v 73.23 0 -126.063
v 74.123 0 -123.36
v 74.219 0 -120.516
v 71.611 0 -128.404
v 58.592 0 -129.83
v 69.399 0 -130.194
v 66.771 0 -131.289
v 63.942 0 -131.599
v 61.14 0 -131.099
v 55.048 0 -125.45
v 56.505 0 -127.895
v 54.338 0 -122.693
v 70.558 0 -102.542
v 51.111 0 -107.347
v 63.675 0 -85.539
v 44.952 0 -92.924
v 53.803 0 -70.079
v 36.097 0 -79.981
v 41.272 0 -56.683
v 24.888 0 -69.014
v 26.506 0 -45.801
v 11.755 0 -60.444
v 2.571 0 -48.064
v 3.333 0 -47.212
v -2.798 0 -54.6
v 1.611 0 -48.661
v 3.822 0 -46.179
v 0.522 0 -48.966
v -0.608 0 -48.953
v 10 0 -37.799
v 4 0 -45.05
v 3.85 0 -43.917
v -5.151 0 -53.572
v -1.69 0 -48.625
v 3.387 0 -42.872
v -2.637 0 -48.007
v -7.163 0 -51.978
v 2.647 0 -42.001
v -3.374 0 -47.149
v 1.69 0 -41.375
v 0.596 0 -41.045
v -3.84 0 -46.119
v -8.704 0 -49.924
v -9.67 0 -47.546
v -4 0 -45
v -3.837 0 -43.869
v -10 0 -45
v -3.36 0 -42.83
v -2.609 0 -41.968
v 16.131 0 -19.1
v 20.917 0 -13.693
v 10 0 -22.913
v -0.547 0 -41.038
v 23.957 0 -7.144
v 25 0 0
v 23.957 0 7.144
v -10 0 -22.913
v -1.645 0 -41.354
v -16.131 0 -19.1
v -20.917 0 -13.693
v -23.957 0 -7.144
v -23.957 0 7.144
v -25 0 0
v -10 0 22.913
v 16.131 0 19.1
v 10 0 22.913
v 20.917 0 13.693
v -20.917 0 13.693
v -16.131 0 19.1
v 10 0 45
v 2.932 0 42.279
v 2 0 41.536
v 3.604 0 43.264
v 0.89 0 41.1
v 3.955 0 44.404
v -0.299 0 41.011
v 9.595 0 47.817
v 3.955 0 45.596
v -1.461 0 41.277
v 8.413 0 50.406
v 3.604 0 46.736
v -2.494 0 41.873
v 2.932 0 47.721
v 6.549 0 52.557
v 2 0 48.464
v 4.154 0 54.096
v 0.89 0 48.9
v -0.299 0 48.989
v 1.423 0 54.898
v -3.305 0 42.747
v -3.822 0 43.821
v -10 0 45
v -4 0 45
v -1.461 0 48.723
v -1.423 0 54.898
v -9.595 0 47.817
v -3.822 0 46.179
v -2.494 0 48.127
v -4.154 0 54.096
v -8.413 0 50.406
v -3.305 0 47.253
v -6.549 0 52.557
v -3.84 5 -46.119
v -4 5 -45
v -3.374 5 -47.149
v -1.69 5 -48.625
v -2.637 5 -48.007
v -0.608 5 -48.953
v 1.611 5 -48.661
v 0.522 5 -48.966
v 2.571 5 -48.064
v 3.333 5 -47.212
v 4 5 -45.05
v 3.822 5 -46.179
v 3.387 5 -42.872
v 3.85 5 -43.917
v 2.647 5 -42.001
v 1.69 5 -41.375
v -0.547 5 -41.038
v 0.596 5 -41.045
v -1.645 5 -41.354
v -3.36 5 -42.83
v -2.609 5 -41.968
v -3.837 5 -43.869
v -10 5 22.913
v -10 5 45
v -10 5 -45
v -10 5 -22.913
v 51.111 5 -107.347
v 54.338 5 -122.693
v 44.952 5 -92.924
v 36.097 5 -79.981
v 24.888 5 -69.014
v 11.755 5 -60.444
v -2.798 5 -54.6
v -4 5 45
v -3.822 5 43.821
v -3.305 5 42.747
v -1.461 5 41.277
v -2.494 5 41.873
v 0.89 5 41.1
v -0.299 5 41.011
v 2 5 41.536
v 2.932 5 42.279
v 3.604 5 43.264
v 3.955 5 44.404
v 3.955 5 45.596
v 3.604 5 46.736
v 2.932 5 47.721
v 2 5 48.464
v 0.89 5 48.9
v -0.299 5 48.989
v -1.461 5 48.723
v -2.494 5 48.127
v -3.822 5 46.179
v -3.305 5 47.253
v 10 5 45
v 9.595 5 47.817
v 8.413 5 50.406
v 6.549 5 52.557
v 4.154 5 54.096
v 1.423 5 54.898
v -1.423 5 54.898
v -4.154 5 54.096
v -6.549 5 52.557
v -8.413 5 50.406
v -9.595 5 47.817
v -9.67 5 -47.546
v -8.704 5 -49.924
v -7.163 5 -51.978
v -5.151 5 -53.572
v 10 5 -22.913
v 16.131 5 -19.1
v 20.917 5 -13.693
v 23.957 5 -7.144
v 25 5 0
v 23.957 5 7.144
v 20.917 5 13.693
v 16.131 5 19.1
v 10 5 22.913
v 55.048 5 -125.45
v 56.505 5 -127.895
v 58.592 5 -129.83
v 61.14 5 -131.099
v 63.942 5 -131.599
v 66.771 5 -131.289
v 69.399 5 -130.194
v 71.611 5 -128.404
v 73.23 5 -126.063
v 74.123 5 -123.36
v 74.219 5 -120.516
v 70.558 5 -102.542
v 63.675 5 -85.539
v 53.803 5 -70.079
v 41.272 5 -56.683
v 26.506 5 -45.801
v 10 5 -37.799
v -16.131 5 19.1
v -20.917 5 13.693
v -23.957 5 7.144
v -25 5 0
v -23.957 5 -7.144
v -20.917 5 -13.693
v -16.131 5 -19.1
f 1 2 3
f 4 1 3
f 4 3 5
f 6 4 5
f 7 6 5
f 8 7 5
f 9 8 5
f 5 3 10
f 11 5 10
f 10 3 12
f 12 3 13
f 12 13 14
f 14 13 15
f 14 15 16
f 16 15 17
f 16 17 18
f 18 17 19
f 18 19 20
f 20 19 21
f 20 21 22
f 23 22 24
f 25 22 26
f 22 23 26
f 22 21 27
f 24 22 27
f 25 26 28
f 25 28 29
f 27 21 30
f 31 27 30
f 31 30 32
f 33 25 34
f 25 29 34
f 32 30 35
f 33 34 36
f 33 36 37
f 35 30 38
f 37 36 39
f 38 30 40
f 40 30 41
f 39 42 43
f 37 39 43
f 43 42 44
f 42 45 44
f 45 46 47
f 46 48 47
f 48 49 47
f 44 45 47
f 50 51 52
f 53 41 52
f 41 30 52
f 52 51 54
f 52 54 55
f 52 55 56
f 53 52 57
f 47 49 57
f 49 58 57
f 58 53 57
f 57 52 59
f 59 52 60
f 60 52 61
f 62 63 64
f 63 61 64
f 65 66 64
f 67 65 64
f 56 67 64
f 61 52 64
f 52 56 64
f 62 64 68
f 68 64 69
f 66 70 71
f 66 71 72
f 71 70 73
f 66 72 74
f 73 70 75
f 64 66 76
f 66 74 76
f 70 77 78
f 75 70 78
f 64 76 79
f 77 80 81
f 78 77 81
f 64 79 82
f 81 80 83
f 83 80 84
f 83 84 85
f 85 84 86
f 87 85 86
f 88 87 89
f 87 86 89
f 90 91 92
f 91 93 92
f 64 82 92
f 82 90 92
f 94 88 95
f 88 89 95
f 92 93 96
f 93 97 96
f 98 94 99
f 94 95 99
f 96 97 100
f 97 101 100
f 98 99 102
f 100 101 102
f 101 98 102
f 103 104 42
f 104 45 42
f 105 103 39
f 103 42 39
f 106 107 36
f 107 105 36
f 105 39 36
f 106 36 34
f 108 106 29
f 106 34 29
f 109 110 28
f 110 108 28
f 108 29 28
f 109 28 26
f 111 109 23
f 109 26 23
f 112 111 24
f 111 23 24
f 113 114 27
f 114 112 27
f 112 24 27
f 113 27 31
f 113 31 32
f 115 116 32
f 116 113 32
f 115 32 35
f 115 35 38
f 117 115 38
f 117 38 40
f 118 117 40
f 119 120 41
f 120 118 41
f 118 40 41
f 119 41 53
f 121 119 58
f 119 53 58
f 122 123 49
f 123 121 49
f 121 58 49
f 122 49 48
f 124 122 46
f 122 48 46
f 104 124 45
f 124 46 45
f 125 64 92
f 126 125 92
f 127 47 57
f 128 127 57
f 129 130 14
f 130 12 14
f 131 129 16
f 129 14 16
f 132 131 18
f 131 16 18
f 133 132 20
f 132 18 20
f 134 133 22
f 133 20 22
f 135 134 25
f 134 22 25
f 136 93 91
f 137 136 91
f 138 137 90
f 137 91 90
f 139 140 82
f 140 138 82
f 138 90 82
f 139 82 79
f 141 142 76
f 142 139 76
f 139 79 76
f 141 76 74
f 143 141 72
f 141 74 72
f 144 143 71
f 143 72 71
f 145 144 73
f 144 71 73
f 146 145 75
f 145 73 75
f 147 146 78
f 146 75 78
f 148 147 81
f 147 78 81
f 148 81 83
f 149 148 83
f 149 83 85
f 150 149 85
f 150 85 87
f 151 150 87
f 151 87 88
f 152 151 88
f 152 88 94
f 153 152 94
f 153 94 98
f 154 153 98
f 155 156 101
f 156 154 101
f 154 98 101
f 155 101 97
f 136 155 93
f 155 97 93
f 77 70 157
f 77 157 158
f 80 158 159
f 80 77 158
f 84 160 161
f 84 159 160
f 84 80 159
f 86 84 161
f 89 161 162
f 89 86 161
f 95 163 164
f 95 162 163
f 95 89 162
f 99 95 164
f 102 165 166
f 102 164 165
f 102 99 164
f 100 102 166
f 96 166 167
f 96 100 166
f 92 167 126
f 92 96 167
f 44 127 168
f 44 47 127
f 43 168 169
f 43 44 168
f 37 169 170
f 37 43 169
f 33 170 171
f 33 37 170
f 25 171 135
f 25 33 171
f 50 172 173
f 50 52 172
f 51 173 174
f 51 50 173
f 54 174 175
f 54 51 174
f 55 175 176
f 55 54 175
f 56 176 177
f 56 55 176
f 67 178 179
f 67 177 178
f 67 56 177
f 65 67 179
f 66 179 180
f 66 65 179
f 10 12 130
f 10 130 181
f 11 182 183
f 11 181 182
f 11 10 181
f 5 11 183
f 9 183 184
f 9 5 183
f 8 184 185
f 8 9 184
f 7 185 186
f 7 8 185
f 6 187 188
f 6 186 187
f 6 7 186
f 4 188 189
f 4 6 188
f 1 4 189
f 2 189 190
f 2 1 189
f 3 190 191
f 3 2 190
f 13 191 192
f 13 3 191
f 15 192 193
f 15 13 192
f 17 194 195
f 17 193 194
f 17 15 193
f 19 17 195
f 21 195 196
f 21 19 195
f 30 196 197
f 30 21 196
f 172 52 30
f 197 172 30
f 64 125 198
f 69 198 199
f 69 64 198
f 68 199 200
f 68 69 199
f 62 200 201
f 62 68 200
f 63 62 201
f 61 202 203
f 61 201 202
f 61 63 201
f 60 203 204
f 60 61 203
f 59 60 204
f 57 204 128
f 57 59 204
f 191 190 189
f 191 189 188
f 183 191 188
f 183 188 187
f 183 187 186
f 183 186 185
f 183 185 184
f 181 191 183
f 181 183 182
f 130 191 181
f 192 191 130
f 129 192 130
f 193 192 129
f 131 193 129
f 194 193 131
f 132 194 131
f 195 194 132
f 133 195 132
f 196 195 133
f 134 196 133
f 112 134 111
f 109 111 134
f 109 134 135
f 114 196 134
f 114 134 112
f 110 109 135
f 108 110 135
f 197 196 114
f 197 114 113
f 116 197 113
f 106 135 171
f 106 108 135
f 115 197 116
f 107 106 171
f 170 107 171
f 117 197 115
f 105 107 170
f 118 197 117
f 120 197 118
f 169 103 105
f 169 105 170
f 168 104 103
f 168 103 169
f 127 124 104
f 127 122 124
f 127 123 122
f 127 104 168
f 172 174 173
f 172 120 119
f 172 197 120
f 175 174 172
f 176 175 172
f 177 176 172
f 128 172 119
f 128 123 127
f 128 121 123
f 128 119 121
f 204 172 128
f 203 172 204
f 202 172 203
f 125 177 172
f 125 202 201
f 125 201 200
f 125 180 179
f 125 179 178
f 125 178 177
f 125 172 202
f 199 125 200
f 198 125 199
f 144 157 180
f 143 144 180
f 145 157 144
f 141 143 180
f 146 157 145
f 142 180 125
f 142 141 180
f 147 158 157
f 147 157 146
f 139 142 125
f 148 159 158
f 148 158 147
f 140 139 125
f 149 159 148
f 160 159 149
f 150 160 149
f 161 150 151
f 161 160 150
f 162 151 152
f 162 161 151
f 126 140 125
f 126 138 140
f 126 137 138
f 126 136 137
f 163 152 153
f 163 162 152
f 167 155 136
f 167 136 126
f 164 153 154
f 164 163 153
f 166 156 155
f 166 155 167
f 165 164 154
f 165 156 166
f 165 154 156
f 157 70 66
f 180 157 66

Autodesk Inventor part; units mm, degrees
ref_plane "YZ Plane" through (0, 0, 0) normal (1, 0, 0) x (0, 1, 0)
ref_plane "XZ Plane" through (0, 0, 0) normal (0, 1, 0) x (-1, 0, 0)
ref_plane "XY Plane" through (0, 0, 0) normal (0, 0, 1) x (1, 0, 0)
sketch "Sketch1" plane through (0, 0, 0) normal (0, 1, 0) x (-1, 0, 0)
  line L0 (0, 45) -> (0, -45) construction
  line L1 (-10, 45) -> (-10, -45)
  line L2 (10, -45) -> (10, 45)
  arc A0 (10, 45) -> (-10, 45) centre (0, 45) ccw
  arc A1 (-10, -45) -> (10, -45) centre (0, -45) ccw
  circle A2 centre (0, 45) radius 4
  circle A3 centre (0, -45) radius 4
  arc A4 (0, -45) -> (-64.2788, -121.6044) centre (25.1861, -131.404) ccw construction
  arc A5 (-2.7985, -35.3996) -> (-74.2193, -120.5156) centre (25.1861, -131.404) ccw
  arc A6 (2.7985, -54.6004) -> (-54.3382, -122.6933) centre (25.1861, -131.404) ccw
  arc A7 (2.7985, -54.6004) -> (-2.7985, -35.3996) centre (0, -45) ccw
  arc A8 (-74.2193, -120.5156) -> (-54.3382, -122.6933) centre (-64.2788, -121.6044) ccw
  line L3 (-64.2788, -121.6044) -> (0, -45)
  circle A9 centre (0, 0) radius 25
  point P0 (-6.4279, -52.6604)
  point P1 (10, -22.9129)
  point P2 (10, 22.9129)
  point P3 (-10, 22.9129)
  point P4 (-10, -22.9129)
  point P5 (-10, -37.7988)
  point P6 (-13.9586, -61.6352)
  point P7 (2.7985, -54.6004)
  dimension "d0" = 20
  dimension "d2" = 90
  dimension "d3" = 8
  dimension "d4" = 8
  dimension "d5" = 20
  dimension "d7" = 100
  dimension "d8" = 140
  dimension "d9" = 100
  dimension "d10" = 50
extrude "Extrusion1" add sketch "Sketch1" along normal blind 5 contours A0 L2 A9 L1 | A9 L2 L1 | L1 A9 | A9 L2 A7 A5 L1 | A9 L2 | A5 A7 A1 L1 | L1 A1 L3 A6 A8 A5 | A1 A6 L3
equation "\"d0\" = AnEsl"
equation "\"d5\" = AnEsl"
equation "\"d10\" = DV"
equation "\"DV\" = 50"
equation "\"AnEsl\" = 20"
properties part number "Pinzas"
